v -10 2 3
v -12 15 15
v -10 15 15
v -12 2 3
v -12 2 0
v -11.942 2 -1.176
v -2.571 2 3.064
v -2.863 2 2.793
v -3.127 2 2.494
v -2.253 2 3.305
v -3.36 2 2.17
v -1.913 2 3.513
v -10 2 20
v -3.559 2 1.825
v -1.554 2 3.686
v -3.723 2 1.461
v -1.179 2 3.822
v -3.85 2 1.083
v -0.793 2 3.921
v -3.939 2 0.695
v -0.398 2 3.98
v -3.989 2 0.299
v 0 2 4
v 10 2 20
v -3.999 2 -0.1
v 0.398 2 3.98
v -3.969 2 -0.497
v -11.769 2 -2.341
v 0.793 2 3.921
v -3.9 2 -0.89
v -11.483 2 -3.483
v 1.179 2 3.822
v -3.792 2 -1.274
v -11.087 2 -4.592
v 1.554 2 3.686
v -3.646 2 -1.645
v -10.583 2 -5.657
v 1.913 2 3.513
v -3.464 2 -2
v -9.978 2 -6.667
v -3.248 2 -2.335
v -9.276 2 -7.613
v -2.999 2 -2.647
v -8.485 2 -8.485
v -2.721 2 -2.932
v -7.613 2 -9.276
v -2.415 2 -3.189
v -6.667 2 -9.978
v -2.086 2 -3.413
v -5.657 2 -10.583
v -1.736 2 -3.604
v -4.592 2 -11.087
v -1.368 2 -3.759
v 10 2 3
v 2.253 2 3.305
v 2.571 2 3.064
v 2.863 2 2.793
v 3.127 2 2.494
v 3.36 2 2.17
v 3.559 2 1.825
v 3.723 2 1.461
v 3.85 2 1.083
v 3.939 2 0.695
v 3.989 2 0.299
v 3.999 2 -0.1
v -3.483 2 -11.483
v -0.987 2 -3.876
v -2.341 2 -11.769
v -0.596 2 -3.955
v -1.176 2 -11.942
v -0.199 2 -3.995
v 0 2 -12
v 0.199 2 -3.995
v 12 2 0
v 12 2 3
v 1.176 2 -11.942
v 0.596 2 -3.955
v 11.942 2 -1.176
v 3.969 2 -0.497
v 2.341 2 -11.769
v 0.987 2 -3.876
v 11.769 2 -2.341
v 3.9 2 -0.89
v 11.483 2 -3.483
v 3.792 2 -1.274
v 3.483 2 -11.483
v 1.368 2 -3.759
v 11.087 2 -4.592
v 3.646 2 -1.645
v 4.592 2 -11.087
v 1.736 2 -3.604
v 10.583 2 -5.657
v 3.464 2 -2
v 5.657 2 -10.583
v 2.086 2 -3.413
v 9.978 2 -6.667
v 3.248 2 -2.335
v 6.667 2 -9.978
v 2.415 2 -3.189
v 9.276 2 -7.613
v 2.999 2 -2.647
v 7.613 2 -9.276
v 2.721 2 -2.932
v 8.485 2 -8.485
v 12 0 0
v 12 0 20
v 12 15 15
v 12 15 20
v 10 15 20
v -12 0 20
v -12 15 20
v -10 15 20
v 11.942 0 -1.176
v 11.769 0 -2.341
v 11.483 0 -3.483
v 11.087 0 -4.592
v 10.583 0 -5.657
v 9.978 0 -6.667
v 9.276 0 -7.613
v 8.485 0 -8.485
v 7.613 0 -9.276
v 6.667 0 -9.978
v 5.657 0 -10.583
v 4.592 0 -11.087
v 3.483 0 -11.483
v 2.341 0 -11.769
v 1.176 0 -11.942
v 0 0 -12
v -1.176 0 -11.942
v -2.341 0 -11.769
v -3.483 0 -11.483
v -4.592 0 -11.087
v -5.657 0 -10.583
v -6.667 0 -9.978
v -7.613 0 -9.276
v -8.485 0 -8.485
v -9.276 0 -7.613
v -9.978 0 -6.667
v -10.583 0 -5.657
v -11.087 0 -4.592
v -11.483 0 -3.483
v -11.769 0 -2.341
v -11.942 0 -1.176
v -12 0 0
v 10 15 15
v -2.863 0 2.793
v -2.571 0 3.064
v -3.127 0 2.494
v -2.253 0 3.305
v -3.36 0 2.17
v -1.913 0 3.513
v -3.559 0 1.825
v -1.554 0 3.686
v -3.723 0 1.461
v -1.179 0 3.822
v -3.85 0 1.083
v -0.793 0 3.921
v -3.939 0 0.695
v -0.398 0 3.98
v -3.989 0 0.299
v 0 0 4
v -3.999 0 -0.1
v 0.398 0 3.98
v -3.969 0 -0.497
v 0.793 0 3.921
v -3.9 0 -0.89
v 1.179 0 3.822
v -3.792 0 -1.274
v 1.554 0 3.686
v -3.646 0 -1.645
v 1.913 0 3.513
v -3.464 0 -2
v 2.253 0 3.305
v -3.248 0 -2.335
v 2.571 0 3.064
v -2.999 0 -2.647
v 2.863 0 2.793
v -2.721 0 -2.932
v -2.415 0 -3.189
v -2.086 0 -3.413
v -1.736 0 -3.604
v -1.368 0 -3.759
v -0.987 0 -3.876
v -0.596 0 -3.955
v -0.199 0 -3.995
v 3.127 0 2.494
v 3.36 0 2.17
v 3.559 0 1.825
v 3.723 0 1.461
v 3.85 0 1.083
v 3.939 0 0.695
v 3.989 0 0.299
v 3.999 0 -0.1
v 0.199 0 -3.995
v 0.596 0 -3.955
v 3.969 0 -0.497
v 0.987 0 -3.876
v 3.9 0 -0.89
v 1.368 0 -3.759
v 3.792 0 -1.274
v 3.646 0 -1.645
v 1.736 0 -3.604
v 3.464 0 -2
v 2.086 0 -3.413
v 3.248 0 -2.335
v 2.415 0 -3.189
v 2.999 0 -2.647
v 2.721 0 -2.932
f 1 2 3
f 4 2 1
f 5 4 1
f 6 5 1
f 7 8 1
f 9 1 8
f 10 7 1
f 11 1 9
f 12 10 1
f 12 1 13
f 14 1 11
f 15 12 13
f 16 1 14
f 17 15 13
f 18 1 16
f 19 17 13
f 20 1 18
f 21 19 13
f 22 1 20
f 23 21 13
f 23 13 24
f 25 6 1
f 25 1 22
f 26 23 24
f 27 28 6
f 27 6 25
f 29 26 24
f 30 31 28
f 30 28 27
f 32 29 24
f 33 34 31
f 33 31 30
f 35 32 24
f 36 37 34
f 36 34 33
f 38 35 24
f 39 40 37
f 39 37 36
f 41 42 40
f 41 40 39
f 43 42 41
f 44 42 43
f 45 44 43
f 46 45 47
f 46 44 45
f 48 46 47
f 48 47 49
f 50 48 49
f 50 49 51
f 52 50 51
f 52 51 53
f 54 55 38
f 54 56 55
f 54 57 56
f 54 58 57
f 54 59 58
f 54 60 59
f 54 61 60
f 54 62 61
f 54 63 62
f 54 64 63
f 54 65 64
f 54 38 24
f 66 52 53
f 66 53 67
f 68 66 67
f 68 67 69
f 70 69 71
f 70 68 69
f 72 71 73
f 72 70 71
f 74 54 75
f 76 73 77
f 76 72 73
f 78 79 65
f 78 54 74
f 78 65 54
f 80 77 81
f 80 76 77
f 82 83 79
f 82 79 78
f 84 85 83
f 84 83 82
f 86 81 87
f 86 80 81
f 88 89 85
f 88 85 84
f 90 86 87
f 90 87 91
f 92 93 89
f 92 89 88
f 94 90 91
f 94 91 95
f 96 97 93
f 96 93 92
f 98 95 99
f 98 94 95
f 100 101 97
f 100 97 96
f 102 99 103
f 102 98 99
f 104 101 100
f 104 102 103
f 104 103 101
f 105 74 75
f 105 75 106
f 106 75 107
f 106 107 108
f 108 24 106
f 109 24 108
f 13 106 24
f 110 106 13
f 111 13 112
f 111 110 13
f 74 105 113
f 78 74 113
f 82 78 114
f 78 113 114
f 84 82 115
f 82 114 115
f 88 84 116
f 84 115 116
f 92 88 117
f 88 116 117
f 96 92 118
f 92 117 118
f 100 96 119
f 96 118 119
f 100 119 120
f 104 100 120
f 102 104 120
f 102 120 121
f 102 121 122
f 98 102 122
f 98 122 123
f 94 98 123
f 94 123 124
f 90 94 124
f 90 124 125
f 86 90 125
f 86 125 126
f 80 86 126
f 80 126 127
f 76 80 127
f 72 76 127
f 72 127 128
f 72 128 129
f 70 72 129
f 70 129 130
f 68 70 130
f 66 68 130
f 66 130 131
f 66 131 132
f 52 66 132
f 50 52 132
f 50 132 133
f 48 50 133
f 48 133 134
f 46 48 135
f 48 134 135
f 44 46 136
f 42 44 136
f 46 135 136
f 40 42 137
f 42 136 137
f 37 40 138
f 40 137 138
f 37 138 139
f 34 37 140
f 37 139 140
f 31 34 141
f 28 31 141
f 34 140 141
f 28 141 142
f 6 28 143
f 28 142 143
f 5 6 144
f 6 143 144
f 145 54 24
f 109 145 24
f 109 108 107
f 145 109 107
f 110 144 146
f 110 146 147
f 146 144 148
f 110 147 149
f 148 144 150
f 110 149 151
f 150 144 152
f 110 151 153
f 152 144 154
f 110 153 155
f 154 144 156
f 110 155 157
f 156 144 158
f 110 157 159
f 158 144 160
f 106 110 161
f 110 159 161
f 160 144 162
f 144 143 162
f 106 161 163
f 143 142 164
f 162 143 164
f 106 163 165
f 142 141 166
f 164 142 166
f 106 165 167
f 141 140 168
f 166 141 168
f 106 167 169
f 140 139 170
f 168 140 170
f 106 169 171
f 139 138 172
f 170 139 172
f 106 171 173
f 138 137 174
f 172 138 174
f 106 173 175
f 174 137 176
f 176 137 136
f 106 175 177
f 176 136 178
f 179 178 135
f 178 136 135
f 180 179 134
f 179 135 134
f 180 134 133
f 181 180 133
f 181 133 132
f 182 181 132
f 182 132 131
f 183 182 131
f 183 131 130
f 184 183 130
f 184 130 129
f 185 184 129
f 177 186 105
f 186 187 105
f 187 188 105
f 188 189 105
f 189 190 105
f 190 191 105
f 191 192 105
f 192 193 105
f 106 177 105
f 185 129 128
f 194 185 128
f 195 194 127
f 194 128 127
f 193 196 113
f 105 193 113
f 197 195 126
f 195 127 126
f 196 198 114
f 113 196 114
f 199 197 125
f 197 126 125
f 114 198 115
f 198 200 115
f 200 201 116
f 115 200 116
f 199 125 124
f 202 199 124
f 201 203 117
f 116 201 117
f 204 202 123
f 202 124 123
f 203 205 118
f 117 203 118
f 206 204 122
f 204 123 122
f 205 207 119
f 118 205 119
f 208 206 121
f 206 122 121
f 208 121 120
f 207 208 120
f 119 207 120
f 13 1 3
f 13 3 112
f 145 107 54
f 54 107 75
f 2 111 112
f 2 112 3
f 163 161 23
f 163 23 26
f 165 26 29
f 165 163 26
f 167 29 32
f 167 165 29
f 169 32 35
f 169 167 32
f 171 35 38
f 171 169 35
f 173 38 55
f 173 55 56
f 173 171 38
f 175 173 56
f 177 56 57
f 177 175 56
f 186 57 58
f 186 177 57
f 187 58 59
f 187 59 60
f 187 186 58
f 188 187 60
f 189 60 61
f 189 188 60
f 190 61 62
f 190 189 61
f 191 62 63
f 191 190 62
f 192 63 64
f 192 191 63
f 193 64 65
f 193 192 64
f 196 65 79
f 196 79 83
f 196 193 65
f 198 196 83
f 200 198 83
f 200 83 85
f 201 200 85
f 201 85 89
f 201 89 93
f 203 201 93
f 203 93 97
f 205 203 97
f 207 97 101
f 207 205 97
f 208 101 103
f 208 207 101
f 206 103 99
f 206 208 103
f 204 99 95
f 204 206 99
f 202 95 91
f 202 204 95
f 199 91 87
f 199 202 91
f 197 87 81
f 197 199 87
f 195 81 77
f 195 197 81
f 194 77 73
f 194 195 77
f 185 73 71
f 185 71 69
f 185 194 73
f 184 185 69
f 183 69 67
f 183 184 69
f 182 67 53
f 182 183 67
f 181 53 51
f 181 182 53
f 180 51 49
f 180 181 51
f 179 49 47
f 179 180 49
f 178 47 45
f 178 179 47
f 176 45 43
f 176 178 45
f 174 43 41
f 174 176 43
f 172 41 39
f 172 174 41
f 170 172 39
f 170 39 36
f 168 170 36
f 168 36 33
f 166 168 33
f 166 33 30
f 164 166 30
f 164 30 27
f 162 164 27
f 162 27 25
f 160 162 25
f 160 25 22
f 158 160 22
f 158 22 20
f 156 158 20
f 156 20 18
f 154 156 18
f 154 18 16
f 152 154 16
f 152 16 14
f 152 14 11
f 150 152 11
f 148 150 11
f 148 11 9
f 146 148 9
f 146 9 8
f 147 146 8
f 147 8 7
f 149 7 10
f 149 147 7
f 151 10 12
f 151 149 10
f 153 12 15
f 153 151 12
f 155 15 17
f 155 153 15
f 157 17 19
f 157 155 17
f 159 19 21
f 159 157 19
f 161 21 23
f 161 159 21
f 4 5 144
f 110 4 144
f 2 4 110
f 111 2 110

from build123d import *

# Parameters (mm, degrees)
SKETCH_1_R          = 12
SKETCH_1_R_2        = 4
EXTRUDE_1_DEPTH     = 2
EXTRUDE_2_DEPTH     = 2
BOSS_EXTRUDE1_START = -24
BOSS_EXTRUDE1_DEPTH = 2


with BuildPart() as part:
    # 草图1 → 凸台-拉伸1 (new body)
    # profile 1 of 2: a face of its own
    with BuildSketch(Plane(origin=(0, 0, 0), x_dir=(1, 0, 0), z_dir=(0, 1, 0))):
        Circle(SKETCH_1_R)
        with Locations(Location((0, 0, 0), (0, 0, 270))):
            Circle(SKETCH_1_R_2, mode=Mode.SUBTRACT)
    # profile 2 of 2: a face of its own
    with BuildSketch(Plane(origin=(0, 0, 0), x_dir=(1, 0, 0), z_dir=(0, 1, 0))):
        with BuildLine():
            ThreePointArc((12, 0), (0, -12), (-12, 0))
            Line((-12, 0), (-12, -20))
            Line((-12, -20), (12, -20))
            Line((12, -20), (12, 0))
        make_face()
    extrude(amount=EXTRUDE_1_DEPTH)

    # 草图3 → 凸台-拉伸2 (add)
    with BuildSketch(Plane(origin=(12, 0, 0), x_dir=(0, 0, -1), z_dir=(1, 0, 0))):
        Polygon((-20, 2), (-20, 15), (-15, 15), (-3, 2), align=None)
    extrude(amount=-EXTRUDE_2_DEPTH)

    # 草图3<2> → Boss-Extrude1 (add)
    with BuildSketch(Plane(origin=(12, 0, 0), x_dir=(0, 0, -1), z_dir=(1, 0, 0)).offset(BOSS_EXTRUDE1_START)):
        Polygon((-20, 2), (-20, 15), (-15, 15), (-3, 2), align=None)
    extrude(amount=BOSS_EXTRUDE1_DEPTH)


solid = part.part
